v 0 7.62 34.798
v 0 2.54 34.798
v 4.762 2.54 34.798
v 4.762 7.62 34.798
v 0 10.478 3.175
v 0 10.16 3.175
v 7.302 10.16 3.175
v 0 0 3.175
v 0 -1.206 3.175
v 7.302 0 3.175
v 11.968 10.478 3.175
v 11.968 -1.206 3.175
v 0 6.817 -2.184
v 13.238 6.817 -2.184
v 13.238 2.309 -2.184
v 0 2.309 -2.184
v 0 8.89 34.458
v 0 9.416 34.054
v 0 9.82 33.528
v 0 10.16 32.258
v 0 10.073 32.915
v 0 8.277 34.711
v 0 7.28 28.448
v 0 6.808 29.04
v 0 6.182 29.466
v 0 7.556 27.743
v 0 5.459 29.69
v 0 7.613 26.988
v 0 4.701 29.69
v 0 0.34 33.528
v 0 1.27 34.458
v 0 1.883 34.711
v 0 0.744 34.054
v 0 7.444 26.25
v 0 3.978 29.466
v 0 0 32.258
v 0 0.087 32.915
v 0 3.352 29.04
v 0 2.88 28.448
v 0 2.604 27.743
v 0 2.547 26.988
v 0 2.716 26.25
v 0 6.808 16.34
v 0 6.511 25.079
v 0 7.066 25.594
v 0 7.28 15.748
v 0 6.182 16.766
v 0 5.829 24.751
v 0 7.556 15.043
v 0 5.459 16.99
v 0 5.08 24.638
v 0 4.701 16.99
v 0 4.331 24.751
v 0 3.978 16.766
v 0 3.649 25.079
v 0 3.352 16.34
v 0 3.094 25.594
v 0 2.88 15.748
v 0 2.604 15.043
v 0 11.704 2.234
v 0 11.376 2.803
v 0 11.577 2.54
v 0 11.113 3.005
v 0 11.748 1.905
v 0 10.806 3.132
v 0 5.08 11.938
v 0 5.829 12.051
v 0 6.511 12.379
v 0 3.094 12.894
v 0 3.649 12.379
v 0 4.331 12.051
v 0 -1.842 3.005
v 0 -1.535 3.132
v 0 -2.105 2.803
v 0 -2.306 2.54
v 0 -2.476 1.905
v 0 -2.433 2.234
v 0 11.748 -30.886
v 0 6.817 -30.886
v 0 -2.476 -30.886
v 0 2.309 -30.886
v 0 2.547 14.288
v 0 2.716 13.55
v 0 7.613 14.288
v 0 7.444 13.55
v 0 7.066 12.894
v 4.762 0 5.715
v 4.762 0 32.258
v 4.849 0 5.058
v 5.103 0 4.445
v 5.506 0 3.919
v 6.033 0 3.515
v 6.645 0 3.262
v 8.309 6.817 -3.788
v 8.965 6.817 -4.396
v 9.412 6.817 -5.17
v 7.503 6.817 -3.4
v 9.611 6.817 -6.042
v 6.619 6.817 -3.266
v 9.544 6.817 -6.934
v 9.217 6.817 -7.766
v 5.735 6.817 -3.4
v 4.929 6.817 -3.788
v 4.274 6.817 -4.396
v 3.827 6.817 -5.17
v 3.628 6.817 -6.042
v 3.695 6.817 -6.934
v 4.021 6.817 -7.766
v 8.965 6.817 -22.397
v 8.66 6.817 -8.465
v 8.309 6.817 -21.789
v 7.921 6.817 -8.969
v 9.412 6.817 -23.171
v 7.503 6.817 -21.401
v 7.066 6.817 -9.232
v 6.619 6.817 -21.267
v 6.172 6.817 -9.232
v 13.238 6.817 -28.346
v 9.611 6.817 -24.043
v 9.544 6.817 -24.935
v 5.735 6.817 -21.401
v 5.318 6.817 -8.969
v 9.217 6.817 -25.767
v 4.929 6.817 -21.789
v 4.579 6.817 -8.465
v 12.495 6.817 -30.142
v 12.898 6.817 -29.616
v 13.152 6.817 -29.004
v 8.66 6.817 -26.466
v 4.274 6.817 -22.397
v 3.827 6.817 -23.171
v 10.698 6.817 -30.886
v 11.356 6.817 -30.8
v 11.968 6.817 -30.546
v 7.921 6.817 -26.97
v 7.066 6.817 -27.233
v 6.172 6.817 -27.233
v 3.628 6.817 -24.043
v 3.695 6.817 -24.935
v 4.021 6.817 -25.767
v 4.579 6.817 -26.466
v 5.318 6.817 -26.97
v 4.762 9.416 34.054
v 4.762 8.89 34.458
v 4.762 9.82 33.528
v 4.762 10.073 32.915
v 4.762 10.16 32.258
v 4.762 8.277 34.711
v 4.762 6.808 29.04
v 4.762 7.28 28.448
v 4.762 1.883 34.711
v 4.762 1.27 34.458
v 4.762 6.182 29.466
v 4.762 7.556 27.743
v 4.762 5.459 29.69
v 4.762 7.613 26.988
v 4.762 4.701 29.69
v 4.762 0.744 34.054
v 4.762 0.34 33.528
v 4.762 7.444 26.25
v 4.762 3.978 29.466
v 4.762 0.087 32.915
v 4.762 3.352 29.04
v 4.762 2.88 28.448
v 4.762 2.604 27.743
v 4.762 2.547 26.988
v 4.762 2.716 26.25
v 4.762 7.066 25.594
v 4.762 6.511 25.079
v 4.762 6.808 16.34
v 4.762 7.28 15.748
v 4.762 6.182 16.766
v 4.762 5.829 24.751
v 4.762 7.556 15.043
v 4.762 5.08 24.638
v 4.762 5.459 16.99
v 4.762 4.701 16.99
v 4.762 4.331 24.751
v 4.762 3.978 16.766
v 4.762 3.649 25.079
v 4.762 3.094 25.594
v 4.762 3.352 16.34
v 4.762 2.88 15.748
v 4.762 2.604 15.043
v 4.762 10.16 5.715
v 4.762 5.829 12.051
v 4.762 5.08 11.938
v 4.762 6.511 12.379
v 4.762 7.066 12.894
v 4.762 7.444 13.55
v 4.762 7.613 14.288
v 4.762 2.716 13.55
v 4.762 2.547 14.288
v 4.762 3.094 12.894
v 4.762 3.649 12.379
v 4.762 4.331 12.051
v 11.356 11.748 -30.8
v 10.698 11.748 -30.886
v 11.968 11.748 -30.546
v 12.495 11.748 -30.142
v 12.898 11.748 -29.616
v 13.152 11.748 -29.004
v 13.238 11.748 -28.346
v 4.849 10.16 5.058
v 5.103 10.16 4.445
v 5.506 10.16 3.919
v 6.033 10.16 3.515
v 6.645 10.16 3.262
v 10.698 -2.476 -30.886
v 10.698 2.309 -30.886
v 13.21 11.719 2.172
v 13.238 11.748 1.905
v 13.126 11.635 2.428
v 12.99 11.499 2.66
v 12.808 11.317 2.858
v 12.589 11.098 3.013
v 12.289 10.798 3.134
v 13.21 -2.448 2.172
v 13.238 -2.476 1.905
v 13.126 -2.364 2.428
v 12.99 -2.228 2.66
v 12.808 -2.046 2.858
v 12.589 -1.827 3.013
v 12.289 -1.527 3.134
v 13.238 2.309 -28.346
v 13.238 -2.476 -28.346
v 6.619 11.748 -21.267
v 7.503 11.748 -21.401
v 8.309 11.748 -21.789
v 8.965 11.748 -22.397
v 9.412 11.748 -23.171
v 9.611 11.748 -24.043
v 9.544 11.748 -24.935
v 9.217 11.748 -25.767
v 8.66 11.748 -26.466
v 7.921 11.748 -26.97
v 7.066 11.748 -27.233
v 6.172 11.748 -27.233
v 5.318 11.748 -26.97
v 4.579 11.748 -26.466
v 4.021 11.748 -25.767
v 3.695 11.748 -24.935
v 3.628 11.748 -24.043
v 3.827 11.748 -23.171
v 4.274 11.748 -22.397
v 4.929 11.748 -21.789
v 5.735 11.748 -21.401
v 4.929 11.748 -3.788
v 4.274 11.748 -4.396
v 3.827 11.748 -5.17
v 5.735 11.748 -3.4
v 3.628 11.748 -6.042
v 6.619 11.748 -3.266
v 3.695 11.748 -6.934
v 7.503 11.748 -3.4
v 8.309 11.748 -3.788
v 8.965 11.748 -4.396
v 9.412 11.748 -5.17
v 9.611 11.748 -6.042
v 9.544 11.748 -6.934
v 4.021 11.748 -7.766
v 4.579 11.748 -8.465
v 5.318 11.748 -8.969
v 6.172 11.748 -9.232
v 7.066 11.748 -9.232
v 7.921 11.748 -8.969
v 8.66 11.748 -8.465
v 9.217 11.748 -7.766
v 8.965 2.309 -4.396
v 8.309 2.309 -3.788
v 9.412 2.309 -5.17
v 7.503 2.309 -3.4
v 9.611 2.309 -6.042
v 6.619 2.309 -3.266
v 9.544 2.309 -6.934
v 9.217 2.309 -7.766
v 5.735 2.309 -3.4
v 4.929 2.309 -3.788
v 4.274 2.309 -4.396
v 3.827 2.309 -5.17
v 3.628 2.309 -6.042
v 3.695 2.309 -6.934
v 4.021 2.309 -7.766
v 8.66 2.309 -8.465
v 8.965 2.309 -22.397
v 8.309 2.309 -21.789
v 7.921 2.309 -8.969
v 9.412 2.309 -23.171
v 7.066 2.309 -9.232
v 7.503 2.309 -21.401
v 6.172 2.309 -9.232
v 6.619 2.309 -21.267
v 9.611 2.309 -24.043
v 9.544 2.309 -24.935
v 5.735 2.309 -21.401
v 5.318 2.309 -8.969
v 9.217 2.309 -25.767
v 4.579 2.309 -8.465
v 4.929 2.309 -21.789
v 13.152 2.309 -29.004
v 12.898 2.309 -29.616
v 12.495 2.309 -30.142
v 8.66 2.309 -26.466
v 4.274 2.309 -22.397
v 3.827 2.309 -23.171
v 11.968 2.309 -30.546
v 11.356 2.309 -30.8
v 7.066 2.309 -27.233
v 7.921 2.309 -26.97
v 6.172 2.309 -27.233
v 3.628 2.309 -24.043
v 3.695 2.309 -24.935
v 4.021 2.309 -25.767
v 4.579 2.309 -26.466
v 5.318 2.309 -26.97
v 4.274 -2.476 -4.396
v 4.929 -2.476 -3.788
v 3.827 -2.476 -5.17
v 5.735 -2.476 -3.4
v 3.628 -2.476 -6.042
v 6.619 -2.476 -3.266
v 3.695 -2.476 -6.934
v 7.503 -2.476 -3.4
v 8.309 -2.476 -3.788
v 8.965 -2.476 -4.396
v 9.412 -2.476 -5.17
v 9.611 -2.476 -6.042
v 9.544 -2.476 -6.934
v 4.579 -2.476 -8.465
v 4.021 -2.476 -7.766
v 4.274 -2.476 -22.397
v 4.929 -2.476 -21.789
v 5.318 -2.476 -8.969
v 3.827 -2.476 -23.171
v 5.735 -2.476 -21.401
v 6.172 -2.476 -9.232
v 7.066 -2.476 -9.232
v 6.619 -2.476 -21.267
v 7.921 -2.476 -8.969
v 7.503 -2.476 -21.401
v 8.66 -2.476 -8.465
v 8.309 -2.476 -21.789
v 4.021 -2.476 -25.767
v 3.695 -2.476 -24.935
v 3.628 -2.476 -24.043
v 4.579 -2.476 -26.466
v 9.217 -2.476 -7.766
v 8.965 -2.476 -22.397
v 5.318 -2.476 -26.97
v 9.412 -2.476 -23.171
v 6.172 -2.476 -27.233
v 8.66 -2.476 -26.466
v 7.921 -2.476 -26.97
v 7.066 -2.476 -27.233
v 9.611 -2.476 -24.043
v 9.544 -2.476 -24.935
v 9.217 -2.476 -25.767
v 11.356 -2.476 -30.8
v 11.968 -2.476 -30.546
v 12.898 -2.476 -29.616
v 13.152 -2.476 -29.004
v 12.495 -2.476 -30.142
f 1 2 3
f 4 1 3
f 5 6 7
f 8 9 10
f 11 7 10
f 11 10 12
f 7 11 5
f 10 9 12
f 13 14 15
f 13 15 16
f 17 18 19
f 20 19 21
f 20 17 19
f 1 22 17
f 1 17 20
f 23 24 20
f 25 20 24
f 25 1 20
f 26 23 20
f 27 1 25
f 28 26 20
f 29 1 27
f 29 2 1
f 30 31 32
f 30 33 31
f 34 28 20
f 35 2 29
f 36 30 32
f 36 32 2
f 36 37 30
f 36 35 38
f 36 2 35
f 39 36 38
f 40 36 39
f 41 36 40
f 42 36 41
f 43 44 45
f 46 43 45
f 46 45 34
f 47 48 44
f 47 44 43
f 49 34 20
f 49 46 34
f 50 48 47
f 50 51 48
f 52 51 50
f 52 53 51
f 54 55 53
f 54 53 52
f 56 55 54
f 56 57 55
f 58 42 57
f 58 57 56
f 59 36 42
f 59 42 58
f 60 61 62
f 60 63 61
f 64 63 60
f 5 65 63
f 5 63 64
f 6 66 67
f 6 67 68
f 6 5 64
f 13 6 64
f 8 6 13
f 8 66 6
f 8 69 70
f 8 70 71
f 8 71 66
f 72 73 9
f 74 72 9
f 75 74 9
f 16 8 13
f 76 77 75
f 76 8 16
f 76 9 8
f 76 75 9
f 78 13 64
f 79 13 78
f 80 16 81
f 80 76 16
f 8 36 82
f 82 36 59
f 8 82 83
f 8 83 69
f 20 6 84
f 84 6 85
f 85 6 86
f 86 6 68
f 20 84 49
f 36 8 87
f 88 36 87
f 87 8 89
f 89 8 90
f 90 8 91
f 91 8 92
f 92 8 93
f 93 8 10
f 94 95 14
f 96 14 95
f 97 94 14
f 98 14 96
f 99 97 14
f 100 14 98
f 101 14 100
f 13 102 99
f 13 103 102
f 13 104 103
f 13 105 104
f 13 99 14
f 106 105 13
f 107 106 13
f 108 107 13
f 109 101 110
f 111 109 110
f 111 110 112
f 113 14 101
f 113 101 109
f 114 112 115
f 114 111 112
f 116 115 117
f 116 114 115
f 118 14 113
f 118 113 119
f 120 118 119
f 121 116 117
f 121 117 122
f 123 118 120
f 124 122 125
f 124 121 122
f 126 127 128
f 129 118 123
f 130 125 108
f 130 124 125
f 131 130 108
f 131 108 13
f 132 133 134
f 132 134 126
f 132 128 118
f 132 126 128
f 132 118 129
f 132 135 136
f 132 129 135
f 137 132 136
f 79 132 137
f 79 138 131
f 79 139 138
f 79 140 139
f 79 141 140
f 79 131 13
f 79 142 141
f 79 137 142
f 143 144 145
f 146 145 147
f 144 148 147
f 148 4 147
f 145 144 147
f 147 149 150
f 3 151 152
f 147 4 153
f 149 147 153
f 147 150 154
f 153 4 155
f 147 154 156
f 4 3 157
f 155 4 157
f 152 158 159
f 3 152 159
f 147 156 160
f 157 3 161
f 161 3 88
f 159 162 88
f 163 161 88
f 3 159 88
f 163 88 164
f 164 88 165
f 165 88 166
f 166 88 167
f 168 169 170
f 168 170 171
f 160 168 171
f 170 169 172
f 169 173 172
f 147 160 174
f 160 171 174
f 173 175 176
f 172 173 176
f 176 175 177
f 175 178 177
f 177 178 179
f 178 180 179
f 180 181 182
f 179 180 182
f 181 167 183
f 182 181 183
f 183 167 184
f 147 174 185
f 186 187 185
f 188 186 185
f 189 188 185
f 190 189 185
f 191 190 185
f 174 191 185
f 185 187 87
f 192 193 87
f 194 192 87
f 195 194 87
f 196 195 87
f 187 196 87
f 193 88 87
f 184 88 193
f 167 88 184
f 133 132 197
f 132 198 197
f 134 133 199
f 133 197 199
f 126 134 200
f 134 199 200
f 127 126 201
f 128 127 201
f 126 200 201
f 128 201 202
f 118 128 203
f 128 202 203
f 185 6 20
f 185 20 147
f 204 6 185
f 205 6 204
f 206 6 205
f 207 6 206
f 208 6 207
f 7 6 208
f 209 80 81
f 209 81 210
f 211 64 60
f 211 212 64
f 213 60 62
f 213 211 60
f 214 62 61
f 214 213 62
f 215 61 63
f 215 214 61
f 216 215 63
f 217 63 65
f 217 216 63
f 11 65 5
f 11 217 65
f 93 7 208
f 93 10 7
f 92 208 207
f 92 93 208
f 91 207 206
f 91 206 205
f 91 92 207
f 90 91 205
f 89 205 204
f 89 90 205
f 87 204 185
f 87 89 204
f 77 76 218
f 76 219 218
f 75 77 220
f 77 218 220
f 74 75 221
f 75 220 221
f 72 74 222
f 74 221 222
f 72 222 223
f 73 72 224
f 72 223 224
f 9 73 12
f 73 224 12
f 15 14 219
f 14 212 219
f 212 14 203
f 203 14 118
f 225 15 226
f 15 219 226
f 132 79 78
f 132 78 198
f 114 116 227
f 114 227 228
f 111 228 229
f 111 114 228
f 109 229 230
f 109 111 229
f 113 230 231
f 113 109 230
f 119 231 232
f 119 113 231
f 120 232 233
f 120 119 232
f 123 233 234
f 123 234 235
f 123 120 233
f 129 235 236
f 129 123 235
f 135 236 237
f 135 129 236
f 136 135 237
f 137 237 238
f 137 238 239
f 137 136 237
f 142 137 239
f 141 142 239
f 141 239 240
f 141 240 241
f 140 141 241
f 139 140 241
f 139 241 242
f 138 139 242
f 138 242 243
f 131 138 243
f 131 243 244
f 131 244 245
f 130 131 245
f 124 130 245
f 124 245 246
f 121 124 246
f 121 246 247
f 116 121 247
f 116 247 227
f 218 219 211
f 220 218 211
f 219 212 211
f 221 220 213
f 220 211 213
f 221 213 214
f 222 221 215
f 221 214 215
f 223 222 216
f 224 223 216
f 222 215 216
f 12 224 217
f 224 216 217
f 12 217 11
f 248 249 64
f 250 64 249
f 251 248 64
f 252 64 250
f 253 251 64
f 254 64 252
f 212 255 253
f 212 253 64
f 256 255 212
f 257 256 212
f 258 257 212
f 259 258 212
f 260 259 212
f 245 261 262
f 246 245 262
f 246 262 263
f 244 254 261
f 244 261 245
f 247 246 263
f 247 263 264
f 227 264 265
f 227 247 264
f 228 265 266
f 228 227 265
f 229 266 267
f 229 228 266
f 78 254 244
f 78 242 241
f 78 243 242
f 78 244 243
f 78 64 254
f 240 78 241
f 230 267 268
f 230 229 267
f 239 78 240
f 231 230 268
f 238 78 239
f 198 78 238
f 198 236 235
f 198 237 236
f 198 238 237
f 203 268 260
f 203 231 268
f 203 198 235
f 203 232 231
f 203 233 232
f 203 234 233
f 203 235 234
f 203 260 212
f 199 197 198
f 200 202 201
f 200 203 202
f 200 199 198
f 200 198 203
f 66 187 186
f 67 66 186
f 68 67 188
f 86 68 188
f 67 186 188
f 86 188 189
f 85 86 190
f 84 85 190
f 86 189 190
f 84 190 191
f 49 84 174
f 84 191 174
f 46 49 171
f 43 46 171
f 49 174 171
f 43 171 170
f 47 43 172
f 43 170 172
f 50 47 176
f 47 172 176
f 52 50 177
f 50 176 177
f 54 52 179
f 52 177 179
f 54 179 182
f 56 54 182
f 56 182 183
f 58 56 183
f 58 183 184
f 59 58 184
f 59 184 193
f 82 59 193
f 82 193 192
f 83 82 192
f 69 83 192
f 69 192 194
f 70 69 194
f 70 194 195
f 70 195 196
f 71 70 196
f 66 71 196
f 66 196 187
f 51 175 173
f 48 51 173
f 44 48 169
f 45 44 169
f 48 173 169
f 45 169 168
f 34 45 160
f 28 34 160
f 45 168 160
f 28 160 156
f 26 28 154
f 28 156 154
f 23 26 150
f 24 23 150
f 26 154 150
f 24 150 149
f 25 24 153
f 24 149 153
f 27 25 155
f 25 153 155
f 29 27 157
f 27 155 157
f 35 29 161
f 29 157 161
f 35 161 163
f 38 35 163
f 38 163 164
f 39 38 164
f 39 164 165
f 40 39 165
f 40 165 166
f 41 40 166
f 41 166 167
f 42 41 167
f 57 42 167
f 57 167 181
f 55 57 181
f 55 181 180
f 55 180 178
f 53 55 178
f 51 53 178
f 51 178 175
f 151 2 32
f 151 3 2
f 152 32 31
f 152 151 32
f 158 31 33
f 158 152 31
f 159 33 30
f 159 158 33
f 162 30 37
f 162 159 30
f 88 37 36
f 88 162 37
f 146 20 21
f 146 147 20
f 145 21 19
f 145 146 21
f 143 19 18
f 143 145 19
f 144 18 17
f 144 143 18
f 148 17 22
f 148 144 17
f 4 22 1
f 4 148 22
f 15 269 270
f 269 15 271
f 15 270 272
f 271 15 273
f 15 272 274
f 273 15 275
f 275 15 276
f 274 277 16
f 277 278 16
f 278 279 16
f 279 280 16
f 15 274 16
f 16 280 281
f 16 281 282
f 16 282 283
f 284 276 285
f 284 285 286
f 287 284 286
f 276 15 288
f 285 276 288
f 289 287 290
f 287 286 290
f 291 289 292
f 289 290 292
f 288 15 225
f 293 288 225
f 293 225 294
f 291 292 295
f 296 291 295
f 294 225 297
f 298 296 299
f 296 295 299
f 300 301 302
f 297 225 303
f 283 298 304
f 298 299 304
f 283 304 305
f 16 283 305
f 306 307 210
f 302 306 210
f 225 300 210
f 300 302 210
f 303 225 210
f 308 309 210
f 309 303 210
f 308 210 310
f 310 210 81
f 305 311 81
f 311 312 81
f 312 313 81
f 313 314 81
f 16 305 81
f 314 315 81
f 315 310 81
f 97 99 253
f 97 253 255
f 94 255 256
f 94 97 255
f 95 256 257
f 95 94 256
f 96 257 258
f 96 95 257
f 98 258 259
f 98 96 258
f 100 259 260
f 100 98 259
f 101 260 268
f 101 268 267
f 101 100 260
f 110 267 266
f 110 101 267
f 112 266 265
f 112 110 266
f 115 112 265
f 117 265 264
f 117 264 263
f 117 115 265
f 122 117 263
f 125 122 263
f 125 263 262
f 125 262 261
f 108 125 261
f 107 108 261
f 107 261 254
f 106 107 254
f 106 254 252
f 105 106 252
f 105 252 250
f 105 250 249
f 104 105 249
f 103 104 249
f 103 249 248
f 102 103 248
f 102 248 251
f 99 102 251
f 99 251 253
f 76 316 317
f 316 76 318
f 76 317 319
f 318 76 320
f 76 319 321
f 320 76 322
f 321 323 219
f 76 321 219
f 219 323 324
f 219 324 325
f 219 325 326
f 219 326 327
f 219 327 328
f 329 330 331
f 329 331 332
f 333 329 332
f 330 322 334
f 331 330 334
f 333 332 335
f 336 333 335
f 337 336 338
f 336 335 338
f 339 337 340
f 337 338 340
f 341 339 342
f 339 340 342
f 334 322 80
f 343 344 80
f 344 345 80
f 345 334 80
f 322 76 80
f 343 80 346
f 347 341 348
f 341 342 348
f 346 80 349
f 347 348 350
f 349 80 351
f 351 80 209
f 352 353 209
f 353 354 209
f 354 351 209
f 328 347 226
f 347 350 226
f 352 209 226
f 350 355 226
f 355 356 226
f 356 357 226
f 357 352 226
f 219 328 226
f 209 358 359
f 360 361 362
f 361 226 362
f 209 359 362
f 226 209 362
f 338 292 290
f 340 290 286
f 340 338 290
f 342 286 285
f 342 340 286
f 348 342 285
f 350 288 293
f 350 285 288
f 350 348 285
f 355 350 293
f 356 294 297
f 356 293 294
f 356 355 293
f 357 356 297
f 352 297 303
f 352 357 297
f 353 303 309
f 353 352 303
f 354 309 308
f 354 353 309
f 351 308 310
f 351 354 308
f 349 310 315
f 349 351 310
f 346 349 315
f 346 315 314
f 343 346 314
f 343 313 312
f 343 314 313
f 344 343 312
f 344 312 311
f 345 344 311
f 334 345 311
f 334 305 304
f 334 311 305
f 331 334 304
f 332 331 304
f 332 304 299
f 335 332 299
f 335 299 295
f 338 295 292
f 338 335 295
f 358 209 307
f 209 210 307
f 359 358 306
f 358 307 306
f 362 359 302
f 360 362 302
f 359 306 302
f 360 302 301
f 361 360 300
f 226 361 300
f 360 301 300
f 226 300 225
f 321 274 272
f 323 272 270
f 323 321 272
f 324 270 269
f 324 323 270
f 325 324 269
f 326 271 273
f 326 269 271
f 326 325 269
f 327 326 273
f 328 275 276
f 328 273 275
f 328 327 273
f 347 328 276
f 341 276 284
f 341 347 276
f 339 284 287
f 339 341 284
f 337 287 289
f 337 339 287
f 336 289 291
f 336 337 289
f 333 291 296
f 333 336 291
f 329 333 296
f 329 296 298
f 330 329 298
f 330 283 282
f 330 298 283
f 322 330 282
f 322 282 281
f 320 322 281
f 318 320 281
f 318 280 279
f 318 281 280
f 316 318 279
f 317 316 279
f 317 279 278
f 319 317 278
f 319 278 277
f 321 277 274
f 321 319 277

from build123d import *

# Parameters (mm, degrees)
SKETCH1_W                = 4.7625
SKETCH1_H                = 34.798
BOSS_EXTRUDE1_DEPTH      = 10.16
SKETCH2_R                = 2.54
CUT_EXTRUDE1_DEPTH       = 37.562382448
BOSS_EXTRUDE2_DEPTH      = 6.6675
BOSS_EXTRUDE2_DEPTH_BACK = 7.5565
SKETCH3_W                = 13.23848
SKETCH3_H                = 34.0614
SKETCH3_R                = 2.99974
SKETCH6_W                = 13.23848
SKETCH6_H                = 4.5085
CUT_EXTRUDE3_DEPTH       = 28.702
FILLET1_R                = 2.54
FILLET2_R                = 1.27


with BuildPart() as part:
    # Sketch1 → Boss-Extrude1 (new body)
    with BuildSketch(Plane(origin=(0, 0, 0), x_dir=(1, 0, 0), z_dir=(0, 1, 0))):
        with Locations((2.38125, -17.399)):
            Rectangle(SKETCH1_W, SKETCH1_H)
    extrude(amount=BOSS_EXTRUDE1_DEPTH)

    # Sketch2 → Cut-Extrude1 (cut, through all)
    with BuildSketch(Plane(origin=(4.7625, 0, 0), x_dir=(0, 0, -1), z_dir=(1, 0, 0))):
        with Locations((-27.178, 5.08)):
            Circle(SKETCH2_R)
        with Locations((-14.478, 5.08)):
            Circle(SKETCH2_R)
    extrude(amount=-CUT_EXTRUDE1_DEPTH, mode=Mode.SUBTRACT)

    # Sketch3 → Boss-Extrude2 (add, two sides: drawn at the far end of the back side and taken through both)
    with BuildSketch(Plane(origin=(0, 5.08, 0), x_dir=(1, 0, 0), z_dir=(0, 1, 0)).offset(-BOSS_EXTRUDE2_DEPTH_BACK)):
        with Locations((6.61924, 13.8557)):
            Rectangle(SKETCH3_W, SKETCH3_H)
        with Locations(Location((6.61924, 6.26618, 0), (0, 0, 270))):
            Circle(SKETCH3_R, mode=Mode.SUBTRACT)
        with Locations(Location((6.61924, 24.26716, 0), (0, 0, 270))):
            Circle(SKETCH3_R, mode=Mode.SUBTRACT)
    extrude(amount=BOSS_EXTRUDE2_DEPTH + BOSS_EXTRUDE2_DEPTH_BACK)

    # Sketch6 → Cut-Extrude3 (cut)
    with BuildSketch(Plane(origin=(0, 0, -30.8864), x_dir=(-1, 0, 0), z_dir=(0, 0, -1))):
        with Locations((-6.61924, 4.56311)):
            Rectangle(SKETCH6_W, SKETCH6_H)
    extrude(amount=-CUT_EXTRUDE3_DEPTH, mode=Mode.SUBTRACT)

    # Fillet1
    fillet1_edges = [part.edges().sort_by_distance(p)[0] for p in [
        (4.7625, 5.08, 3.175),
        (13.23848, -0.08382, -30.8864),
        (13.23848, 9.28243, -30.8864),
        (2.38125, 0, 34.798),
        (2.38125, 10.16, 34.798),
    ]]
    fillet(fillet1_edges, radius=FILLET1_R)

    # Fillet2
    fillet2_edges = [part.edges().sort_by_distance(p)[0] for p in [
        (6.61924, -2.4765, 3.175),
        (13.23848, 4.6355, 3.175),
        (6.61924, 11.7475, 3.175),
    ]]
    fillet(fillet2_edges, radius=FILLET2_R)


solid = part.part
